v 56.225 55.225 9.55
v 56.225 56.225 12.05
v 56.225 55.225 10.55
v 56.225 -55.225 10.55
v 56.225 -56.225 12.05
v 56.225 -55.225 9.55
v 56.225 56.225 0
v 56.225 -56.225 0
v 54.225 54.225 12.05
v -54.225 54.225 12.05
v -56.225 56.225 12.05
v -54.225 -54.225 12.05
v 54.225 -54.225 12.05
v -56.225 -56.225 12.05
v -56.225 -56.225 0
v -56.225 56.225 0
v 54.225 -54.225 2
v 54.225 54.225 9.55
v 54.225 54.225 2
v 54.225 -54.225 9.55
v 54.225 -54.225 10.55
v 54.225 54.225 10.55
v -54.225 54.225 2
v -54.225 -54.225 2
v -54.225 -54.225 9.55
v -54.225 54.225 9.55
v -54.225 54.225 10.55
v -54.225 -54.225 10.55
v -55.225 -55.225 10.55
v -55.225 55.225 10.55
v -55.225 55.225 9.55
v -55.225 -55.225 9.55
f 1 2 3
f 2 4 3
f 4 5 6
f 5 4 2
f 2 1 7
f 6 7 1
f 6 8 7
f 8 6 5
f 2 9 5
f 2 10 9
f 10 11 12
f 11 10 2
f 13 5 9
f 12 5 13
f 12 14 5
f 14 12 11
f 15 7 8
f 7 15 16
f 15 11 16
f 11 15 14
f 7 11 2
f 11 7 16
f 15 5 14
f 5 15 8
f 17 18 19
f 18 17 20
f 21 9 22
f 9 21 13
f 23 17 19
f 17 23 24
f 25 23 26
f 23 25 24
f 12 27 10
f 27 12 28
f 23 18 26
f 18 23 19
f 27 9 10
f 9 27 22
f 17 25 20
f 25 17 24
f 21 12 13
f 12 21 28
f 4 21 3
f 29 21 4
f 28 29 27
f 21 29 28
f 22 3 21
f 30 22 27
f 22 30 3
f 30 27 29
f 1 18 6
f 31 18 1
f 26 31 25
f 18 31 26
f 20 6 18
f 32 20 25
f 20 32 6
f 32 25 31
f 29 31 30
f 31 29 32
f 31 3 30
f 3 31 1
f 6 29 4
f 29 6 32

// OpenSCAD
// Dice box for 81d6 (9 x 9 die grid)
//
// Measurements are in millimeters

dice_size = 12.05;  // mm / Dice width + some tolerance
wall_thickness = 2;  // mm / This should be adjusted per printer?
felt_thickness = 2;  // mm / Bottom of the box will have felt

inner_width = 9 * dice_size;
outer_width = inner_width + 2 * wall_thickness;

inner_heigth = dice_size + felt_thickness;
outer_heigth = inner_width + 2 * wall_thickness;

lid_width = inner_width + wall_thickness;

// The base box
translate([0, 0, dice_size/2]) {
    difference() {
        // Base and sides
        cube([outer_width, outer_width, dice_size], center=true);
        
        // Cut out insides
        translate([0, 0, wall_thickness]) {
            cube([inner_width, inner_width, dice_size], center=true);
        }
        
        // Cut out hole for lid
        translate([wall_thickness, 0, dice_size/2 - wall_thickness]) {
            cut_out_depth = wall_thickness/2;
            cut_size = inner_width + 2 * cut_out_depth;
            cube([cut_size+2*wall_thickness, cut_size, wall_thickness/2], center=true);
        }

    }
 
}
